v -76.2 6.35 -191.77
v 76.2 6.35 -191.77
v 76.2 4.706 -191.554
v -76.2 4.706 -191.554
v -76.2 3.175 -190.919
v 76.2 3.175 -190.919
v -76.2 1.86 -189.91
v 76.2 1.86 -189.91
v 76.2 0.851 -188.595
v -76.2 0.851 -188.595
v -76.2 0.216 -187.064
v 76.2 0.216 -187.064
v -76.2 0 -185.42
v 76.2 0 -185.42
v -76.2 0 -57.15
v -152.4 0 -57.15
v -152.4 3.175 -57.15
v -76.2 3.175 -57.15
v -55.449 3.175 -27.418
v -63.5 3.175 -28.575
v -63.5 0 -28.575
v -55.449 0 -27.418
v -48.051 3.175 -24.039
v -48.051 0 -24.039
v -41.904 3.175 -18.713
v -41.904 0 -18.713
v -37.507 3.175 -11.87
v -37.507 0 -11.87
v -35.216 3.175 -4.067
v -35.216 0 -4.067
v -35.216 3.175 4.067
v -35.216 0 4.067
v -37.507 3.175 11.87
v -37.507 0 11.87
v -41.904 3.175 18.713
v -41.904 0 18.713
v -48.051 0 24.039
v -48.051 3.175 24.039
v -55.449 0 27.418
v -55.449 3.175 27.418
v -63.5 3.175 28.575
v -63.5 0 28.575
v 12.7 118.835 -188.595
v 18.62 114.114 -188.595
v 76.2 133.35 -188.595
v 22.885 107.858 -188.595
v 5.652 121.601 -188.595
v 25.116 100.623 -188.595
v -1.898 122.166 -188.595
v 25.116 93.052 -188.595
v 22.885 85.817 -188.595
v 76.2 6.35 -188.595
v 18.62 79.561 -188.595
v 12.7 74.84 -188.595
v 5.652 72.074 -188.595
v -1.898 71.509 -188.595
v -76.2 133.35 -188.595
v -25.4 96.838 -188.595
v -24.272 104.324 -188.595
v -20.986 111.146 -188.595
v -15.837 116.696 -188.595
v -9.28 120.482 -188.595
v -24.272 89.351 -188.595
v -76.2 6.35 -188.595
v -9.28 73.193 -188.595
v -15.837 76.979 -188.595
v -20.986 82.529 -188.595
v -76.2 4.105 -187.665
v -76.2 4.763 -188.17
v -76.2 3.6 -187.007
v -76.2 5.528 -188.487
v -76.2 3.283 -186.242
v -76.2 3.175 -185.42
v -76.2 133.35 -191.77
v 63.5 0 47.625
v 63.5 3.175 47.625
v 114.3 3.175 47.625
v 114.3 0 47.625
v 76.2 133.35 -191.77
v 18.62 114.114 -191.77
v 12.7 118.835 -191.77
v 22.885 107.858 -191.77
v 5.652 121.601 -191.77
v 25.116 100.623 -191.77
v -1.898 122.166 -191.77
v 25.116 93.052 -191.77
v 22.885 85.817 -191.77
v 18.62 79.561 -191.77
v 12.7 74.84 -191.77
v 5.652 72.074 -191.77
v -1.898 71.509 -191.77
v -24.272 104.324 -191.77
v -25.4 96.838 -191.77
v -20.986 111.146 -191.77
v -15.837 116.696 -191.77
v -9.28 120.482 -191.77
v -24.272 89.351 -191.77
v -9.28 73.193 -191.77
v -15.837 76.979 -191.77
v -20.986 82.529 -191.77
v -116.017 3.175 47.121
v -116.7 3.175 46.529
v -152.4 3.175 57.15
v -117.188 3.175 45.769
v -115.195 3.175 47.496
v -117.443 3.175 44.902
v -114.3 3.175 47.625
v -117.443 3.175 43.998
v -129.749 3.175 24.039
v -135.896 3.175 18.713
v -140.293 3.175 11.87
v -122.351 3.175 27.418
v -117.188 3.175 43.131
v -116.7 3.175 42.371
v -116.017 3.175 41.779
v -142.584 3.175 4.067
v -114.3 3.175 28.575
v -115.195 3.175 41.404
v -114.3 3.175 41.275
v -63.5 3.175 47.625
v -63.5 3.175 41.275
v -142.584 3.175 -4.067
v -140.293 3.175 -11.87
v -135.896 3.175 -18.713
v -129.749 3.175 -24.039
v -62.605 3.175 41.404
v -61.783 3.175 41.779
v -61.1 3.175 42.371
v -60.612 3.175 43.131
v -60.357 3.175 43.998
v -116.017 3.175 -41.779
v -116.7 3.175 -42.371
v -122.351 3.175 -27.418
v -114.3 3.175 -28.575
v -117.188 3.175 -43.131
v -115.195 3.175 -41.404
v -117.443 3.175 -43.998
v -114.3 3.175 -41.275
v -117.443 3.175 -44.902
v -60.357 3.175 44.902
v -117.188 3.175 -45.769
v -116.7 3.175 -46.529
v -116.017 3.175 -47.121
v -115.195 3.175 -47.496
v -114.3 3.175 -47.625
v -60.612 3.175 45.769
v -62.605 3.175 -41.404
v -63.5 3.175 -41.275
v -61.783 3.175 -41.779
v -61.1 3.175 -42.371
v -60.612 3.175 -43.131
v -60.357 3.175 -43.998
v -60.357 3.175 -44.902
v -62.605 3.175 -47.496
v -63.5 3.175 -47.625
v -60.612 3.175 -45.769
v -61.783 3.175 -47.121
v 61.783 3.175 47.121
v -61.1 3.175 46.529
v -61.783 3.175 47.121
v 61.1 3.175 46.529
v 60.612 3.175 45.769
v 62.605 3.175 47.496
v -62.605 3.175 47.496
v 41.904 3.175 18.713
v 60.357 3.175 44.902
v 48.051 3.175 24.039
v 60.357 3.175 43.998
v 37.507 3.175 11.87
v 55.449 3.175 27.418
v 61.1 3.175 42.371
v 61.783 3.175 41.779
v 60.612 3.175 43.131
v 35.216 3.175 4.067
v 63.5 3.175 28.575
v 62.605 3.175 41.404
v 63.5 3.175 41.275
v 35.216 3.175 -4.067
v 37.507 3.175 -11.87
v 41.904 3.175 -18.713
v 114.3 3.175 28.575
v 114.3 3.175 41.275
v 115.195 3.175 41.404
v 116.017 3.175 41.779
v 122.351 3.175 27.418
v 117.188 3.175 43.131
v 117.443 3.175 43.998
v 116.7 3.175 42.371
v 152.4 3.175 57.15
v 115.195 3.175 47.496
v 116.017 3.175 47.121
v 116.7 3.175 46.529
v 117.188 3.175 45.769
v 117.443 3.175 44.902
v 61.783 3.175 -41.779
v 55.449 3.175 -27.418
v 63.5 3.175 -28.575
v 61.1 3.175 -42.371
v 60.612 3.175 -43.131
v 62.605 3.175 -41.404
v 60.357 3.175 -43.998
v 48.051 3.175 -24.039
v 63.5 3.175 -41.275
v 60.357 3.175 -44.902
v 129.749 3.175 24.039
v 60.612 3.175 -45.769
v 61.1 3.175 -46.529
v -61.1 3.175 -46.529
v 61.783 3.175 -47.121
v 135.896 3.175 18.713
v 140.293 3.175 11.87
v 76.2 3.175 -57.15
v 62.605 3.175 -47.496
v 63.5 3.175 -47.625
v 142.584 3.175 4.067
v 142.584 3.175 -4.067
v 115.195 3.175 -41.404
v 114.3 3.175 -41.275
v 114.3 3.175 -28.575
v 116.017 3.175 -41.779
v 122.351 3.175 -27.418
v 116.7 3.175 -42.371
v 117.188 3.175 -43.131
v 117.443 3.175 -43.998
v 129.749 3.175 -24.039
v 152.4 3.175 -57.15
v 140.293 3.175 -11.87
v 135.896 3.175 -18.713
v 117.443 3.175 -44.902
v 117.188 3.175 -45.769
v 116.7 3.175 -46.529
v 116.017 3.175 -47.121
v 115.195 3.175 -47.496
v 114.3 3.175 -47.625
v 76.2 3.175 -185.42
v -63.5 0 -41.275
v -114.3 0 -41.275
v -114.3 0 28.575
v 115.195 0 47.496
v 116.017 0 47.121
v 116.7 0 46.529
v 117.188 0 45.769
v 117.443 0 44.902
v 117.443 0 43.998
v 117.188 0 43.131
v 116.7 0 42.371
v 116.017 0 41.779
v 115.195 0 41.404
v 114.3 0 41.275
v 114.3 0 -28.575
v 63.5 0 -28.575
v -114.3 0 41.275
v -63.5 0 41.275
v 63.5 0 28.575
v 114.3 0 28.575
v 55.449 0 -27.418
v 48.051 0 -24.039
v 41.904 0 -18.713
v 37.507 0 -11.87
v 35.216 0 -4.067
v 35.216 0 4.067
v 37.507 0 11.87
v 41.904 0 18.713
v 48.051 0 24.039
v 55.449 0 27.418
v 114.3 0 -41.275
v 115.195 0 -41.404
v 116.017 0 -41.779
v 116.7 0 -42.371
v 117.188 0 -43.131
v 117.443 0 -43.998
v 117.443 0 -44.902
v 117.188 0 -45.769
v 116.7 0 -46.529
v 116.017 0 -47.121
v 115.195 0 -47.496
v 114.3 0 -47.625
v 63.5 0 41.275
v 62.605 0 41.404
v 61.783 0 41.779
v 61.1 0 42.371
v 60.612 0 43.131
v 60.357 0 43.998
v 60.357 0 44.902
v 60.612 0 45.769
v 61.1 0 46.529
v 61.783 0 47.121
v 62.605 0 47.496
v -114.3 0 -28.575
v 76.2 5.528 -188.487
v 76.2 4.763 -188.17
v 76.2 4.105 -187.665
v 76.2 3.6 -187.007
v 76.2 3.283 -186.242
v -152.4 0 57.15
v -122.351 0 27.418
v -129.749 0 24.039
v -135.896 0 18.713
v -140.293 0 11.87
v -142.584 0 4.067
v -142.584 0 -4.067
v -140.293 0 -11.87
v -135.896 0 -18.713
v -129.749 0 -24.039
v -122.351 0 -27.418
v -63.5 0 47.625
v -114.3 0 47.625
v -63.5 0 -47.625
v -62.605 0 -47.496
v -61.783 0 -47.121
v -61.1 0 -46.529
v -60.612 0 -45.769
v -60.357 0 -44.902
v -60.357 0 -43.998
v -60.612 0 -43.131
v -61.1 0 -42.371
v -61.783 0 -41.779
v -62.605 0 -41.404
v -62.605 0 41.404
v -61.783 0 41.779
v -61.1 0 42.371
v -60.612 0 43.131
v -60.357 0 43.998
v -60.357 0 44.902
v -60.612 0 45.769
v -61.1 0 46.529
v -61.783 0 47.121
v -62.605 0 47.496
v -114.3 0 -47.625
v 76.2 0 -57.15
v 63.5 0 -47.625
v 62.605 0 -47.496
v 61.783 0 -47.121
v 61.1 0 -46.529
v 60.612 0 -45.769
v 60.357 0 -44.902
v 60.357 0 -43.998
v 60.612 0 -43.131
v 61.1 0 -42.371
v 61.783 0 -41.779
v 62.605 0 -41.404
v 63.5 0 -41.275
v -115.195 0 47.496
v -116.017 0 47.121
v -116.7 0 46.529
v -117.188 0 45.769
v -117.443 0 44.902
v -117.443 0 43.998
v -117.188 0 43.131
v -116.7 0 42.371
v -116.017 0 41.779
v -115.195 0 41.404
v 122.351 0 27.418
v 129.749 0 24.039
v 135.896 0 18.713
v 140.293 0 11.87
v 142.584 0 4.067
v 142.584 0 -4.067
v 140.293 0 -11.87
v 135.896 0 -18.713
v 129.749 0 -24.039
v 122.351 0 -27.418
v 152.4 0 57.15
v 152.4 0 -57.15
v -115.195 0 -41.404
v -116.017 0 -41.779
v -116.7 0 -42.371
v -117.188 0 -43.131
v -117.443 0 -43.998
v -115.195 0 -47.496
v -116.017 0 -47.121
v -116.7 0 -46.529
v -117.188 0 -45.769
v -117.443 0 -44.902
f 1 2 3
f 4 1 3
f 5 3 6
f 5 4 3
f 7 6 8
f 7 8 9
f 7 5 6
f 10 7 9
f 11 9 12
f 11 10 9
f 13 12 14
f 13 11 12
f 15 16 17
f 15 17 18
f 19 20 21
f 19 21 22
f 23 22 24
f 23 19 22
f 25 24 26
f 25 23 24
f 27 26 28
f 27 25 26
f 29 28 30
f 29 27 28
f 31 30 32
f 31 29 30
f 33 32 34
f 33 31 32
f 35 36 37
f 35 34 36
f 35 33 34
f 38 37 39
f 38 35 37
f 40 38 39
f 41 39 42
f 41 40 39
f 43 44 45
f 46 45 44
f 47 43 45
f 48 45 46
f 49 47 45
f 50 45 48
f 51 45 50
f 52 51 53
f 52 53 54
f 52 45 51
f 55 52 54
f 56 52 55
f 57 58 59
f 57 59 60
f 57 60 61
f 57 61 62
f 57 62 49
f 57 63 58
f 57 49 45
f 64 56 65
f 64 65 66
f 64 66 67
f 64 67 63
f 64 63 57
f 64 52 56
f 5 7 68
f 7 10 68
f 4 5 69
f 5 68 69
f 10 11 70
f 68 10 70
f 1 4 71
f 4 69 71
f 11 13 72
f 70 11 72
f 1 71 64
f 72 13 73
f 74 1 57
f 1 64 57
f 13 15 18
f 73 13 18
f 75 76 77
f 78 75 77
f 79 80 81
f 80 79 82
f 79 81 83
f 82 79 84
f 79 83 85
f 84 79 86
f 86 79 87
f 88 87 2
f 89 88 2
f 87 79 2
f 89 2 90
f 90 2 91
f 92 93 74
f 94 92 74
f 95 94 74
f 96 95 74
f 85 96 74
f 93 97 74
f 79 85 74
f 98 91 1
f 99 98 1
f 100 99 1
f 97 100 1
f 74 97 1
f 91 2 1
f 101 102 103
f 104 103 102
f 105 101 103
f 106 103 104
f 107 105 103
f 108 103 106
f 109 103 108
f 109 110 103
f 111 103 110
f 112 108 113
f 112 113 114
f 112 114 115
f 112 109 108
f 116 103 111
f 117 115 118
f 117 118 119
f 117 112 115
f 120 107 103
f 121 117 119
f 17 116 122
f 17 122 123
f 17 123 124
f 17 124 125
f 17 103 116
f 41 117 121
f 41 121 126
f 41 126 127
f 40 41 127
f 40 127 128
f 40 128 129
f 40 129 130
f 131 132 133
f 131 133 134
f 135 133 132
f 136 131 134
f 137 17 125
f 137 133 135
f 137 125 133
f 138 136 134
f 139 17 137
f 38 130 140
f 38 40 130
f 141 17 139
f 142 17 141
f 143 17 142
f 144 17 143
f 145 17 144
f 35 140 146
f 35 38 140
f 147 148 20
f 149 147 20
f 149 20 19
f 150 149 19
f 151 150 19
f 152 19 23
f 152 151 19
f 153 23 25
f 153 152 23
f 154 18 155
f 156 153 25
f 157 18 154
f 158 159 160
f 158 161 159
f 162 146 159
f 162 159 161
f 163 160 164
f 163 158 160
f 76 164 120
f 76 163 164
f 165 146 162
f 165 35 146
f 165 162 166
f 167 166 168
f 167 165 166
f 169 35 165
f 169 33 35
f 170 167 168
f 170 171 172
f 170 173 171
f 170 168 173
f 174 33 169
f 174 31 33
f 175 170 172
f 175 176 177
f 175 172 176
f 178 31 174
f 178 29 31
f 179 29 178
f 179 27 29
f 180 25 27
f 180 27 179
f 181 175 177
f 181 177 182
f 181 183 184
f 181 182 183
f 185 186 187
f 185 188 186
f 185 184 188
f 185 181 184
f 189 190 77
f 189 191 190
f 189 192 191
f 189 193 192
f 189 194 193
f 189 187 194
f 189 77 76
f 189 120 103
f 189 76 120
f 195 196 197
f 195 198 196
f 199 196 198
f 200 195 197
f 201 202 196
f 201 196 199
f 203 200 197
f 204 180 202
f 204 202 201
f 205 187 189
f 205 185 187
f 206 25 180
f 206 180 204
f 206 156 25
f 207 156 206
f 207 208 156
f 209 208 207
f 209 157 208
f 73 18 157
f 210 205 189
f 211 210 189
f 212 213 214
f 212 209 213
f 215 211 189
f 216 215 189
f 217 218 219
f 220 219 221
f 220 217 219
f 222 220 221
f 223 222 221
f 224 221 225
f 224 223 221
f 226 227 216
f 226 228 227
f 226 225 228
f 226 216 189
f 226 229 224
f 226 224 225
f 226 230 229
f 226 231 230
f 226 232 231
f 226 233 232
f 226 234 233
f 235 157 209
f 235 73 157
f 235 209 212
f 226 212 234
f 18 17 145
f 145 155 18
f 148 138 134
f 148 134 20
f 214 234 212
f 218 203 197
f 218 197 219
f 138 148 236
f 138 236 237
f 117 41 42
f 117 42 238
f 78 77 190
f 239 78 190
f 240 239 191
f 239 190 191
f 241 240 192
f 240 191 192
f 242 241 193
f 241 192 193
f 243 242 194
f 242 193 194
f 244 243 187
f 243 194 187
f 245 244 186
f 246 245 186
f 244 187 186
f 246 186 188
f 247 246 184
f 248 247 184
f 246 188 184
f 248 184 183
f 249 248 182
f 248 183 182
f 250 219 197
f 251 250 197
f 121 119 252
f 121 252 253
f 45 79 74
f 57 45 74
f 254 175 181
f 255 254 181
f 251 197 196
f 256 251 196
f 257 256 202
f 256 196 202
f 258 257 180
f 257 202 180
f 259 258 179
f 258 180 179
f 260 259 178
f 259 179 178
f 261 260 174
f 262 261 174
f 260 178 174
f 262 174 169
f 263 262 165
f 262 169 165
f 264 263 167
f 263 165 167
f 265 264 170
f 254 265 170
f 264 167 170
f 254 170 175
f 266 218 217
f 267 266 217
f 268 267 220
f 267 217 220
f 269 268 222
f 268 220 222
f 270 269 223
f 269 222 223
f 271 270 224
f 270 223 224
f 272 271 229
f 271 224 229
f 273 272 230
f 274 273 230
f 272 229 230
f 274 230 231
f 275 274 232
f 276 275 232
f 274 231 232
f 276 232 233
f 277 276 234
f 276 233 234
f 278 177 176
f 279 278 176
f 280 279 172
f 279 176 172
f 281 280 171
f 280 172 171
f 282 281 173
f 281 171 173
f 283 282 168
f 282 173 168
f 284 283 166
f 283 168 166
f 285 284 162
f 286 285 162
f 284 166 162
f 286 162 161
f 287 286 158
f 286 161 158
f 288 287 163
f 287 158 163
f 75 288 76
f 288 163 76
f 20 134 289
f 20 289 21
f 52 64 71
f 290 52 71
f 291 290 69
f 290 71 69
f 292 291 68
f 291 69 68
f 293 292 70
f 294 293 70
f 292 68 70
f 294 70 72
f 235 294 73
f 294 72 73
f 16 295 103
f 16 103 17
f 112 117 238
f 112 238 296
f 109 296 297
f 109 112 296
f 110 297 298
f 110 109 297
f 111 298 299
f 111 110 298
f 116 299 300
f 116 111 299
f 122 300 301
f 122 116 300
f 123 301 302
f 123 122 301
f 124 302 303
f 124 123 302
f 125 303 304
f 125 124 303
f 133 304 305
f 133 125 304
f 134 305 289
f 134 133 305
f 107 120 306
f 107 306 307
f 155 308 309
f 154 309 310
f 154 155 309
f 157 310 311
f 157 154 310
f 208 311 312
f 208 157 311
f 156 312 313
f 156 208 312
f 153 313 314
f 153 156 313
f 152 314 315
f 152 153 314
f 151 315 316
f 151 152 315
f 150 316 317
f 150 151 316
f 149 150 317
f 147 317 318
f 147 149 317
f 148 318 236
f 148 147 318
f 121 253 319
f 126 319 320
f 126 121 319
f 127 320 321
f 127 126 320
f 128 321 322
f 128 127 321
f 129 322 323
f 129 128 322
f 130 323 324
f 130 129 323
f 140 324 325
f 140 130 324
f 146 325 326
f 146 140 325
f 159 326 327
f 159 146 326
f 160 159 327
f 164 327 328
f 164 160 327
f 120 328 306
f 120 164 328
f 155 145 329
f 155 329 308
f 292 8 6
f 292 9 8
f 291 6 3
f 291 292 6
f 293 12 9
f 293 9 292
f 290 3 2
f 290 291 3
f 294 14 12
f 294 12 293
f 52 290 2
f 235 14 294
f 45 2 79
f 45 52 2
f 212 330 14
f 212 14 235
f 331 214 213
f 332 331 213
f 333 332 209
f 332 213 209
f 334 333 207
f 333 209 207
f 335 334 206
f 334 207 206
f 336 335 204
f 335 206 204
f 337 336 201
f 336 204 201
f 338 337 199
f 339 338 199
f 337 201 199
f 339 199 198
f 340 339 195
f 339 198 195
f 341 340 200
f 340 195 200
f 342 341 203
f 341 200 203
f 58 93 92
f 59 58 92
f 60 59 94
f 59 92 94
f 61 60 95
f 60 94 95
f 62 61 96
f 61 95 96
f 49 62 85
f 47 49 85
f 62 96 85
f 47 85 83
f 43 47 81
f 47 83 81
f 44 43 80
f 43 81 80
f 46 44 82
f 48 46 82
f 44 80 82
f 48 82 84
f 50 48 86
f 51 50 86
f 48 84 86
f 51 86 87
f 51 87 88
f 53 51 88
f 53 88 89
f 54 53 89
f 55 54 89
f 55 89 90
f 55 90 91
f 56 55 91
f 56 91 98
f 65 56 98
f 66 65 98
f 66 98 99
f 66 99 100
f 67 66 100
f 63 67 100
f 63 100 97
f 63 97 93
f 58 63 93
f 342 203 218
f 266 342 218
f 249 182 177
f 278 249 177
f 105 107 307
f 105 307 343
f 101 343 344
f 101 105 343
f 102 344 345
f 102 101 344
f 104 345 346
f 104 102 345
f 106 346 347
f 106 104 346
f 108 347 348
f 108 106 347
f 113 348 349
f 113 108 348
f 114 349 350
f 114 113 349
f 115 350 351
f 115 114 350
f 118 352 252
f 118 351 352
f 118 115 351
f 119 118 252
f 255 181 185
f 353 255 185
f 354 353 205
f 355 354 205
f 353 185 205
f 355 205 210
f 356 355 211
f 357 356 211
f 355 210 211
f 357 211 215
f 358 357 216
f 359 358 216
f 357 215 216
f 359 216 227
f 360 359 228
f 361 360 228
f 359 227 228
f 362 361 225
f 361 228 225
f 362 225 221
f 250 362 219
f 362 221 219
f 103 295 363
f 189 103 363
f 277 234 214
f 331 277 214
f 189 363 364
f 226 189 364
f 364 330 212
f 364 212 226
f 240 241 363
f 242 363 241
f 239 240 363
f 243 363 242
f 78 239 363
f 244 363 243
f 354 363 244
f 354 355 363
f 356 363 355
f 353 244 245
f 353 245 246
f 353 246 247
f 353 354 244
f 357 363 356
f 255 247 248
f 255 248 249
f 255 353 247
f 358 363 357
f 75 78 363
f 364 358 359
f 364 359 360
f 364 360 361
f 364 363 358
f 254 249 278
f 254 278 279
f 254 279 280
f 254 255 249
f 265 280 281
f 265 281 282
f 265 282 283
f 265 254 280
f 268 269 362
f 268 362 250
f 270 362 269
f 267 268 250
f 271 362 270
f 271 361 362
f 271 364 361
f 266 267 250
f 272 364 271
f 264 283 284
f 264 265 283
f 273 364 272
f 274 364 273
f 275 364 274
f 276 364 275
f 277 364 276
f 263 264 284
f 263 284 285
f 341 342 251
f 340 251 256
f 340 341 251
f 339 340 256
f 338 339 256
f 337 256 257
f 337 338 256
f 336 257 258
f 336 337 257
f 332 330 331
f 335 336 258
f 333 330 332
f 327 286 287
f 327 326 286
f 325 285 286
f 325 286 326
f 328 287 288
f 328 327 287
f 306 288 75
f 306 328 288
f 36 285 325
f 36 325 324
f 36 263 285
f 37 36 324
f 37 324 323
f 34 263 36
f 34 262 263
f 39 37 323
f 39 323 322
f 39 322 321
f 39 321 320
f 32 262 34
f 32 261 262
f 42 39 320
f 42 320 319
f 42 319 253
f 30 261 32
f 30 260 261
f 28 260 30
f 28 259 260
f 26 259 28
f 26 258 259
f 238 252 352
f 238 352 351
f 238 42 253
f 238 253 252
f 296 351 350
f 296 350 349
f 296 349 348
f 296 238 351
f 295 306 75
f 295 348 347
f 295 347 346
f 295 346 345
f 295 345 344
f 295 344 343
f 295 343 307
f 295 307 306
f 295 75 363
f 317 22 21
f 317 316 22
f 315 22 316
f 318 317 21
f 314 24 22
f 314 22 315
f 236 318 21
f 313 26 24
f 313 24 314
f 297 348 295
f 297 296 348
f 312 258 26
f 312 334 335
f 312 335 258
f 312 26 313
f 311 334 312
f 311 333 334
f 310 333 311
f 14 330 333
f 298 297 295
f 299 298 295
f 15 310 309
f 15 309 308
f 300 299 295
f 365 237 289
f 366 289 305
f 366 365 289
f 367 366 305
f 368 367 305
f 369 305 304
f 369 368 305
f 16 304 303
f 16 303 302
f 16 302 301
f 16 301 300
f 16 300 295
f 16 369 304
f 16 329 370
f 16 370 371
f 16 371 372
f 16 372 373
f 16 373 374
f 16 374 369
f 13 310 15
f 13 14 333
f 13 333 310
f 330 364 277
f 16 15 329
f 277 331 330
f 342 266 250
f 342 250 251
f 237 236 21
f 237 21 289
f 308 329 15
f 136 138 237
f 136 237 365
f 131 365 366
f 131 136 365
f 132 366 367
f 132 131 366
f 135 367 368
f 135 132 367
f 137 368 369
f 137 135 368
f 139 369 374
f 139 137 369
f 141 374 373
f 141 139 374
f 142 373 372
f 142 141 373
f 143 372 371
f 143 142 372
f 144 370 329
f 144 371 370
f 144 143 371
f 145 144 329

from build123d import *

# Parameters (mm, degrees)
SKETCH1_W              = 304.8
SKETCH1_H              = 114.3
BOSS_EXTRUDE1_DEPTH    = 3.175
CUT_EXTRUDE1_DEPTH     = 163.79423554
SKETCH3_W              = 152.4
SKETCH3_H              = 3.175
BOSS_EXTRUDE2_DEPTH    = 131.445
SKETCH4_W              = 152.4
SKETCH4_H              = 3.175
BOSS_EXTRUDE3_DEPTH    = 133.35
CONVERT_SOLID1_START   = -76.2
CONVERT_SOLID1_DEPTH   = 152.4
CONVERT_SOLID1_2_DEPTH = 152.4
SKETCH5_R              = 25.4
CUT_EXTRUDE2_DEPTH     = 321.888062882


# Read off the part's stored shape, not the designer's step: Convert-Solid1
with BuildPart() as part:
    # Sketch1 → Boss-Extrude1 (new body)
    with BuildSketch(Plane(origin=(0, 0, 0), x_dir=(1, 0, 0), z_dir=(0, 1, 0))):
        Rectangle(SKETCH1_W, SKETCH1_H)
    extrude(amount=BOSS_EXTRUDE1_DEPTH)

    # Sketch2 → Cut-Extrude1 (cut, through all)
    with BuildSketch(Plane(origin=(0, 3.175, 0), x_dir=(1, 0, 0), z_dir=(0, 1, 0))):
        with BuildLine():
            Line((-114.3, -41.275), (-63.5, -41.275))
            ThreePointArc((-63.5, -41.275), (-60.325, -44.45), (-63.5, -47.625))
            Line((-63.5, -47.625), (-114.3, -47.625))
            ThreePointArc((-114.3, -47.625), (-117.475, -44.45), (-114.3, -41.275))
        make_face()
        with BuildLine():
            Line((-114.3, 47.625), (-63.5, 47.625))
            ThreePointArc((-63.5, 47.625), (-60.325, 44.45), (-63.5, 41.275))
            Line((-63.5, 41.275), (-114.3, 41.275))
            ThreePointArc((-114.3, 41.275), (-117.475, 44.45), (-114.3, 47.625))
        make_face()
        with BuildLine():
            Line((-114.3, 28.575), (-63.5, 28.575))
            ThreePointArc((-63.5, 28.575), (-34.925, 0), (-63.5, -28.575))
            Line((-63.5, -28.575), (-114.3, -28.575))
            ThreePointArc((-114.3, -28.575), (-142.875, 0), (-114.3, 28.575))
        make_face()
    cut_extrude1 = extrude(amount=-CUT_EXTRUDE1_DEPTH, mode=Mode.SUBTRACT)

    # Sketch3 → Boss-Extrude2 (add)
    with BuildSketch(Plane.XY.offset(-57.15)):
        with Locations((0, 1.5875)):
            Rectangle(SKETCH3_W, SKETCH3_H)
    extrude(amount=-BOSS_EXTRUDE2_DEPTH)

    # Sketch4 → Boss-Extrude3 (add)
    with BuildSketch(Plane(origin=(0, 0, 0), x_dir=(-1, 0, 0), z_dir=(0, -1, 0))):
        with Locations((0, 190.1825)):
            Rectangle(SKETCH4_W, SKETCH4_H)
    extrude(amount=-BOSS_EXTRUDE3_DEPTH)

    # Convert-Solid1 outline → Convert-Solid1 (cut)
    with BuildSketch(Plane.YZ.offset(CONVERT_SOLID1_START)):
        with BuildLine():
            ThreePointArc((6.35, -191.77), (1.859871939, -189.910128061), (0, -185.42))
            Line((0, -185.42), (0, -191.77))
            Line((0, -191.77), (6.35, -191.77))
        make_face()
    extrude(amount=CONVERT_SOLID1_DEPTH, mode=Mode.SUBTRACT)

    # Convert-Solid1 2 outline → Convert-Solid1 2 (add)
    with BuildSketch(Plane.YZ.offset(CONVERT_SOLID1_START)):
        with BuildLine():
            ThreePointArc((6.35, -188.595), (4.10493597, -187.66506403), (3.175, -185.42))
            Line((3.175, -185.42), (3.175, -188.595))
            Line((3.175, -188.595), (6.35, -188.595))
        make_face()
    extrude(amount=CONVERT_SOLID1_2_DEPTH)

    # Mirror1: Cut-Extrude1 across plane
    add(cut_extrude1.mirror(Plane(origin=(0, 0, 0), x_dir=(0, 0, 1), z_dir=(1, 0, 0))), mode=Mode.SUBTRACT)

    # Sketch5 → Cut-Extrude2 (cut, through all)
    with BuildSketch(Plane(origin=(0, 0, -191.77), x_dir=(-1, 0, 0), z_dir=(0, 0, -1))):
        with Locations((0, 96.8375)):
            Circle(SKETCH5_R)
    extrude(amount=-CUT_EXTRUDE2_DEPTH, mode=Mode.SUBTRACT)


solid = part.part
